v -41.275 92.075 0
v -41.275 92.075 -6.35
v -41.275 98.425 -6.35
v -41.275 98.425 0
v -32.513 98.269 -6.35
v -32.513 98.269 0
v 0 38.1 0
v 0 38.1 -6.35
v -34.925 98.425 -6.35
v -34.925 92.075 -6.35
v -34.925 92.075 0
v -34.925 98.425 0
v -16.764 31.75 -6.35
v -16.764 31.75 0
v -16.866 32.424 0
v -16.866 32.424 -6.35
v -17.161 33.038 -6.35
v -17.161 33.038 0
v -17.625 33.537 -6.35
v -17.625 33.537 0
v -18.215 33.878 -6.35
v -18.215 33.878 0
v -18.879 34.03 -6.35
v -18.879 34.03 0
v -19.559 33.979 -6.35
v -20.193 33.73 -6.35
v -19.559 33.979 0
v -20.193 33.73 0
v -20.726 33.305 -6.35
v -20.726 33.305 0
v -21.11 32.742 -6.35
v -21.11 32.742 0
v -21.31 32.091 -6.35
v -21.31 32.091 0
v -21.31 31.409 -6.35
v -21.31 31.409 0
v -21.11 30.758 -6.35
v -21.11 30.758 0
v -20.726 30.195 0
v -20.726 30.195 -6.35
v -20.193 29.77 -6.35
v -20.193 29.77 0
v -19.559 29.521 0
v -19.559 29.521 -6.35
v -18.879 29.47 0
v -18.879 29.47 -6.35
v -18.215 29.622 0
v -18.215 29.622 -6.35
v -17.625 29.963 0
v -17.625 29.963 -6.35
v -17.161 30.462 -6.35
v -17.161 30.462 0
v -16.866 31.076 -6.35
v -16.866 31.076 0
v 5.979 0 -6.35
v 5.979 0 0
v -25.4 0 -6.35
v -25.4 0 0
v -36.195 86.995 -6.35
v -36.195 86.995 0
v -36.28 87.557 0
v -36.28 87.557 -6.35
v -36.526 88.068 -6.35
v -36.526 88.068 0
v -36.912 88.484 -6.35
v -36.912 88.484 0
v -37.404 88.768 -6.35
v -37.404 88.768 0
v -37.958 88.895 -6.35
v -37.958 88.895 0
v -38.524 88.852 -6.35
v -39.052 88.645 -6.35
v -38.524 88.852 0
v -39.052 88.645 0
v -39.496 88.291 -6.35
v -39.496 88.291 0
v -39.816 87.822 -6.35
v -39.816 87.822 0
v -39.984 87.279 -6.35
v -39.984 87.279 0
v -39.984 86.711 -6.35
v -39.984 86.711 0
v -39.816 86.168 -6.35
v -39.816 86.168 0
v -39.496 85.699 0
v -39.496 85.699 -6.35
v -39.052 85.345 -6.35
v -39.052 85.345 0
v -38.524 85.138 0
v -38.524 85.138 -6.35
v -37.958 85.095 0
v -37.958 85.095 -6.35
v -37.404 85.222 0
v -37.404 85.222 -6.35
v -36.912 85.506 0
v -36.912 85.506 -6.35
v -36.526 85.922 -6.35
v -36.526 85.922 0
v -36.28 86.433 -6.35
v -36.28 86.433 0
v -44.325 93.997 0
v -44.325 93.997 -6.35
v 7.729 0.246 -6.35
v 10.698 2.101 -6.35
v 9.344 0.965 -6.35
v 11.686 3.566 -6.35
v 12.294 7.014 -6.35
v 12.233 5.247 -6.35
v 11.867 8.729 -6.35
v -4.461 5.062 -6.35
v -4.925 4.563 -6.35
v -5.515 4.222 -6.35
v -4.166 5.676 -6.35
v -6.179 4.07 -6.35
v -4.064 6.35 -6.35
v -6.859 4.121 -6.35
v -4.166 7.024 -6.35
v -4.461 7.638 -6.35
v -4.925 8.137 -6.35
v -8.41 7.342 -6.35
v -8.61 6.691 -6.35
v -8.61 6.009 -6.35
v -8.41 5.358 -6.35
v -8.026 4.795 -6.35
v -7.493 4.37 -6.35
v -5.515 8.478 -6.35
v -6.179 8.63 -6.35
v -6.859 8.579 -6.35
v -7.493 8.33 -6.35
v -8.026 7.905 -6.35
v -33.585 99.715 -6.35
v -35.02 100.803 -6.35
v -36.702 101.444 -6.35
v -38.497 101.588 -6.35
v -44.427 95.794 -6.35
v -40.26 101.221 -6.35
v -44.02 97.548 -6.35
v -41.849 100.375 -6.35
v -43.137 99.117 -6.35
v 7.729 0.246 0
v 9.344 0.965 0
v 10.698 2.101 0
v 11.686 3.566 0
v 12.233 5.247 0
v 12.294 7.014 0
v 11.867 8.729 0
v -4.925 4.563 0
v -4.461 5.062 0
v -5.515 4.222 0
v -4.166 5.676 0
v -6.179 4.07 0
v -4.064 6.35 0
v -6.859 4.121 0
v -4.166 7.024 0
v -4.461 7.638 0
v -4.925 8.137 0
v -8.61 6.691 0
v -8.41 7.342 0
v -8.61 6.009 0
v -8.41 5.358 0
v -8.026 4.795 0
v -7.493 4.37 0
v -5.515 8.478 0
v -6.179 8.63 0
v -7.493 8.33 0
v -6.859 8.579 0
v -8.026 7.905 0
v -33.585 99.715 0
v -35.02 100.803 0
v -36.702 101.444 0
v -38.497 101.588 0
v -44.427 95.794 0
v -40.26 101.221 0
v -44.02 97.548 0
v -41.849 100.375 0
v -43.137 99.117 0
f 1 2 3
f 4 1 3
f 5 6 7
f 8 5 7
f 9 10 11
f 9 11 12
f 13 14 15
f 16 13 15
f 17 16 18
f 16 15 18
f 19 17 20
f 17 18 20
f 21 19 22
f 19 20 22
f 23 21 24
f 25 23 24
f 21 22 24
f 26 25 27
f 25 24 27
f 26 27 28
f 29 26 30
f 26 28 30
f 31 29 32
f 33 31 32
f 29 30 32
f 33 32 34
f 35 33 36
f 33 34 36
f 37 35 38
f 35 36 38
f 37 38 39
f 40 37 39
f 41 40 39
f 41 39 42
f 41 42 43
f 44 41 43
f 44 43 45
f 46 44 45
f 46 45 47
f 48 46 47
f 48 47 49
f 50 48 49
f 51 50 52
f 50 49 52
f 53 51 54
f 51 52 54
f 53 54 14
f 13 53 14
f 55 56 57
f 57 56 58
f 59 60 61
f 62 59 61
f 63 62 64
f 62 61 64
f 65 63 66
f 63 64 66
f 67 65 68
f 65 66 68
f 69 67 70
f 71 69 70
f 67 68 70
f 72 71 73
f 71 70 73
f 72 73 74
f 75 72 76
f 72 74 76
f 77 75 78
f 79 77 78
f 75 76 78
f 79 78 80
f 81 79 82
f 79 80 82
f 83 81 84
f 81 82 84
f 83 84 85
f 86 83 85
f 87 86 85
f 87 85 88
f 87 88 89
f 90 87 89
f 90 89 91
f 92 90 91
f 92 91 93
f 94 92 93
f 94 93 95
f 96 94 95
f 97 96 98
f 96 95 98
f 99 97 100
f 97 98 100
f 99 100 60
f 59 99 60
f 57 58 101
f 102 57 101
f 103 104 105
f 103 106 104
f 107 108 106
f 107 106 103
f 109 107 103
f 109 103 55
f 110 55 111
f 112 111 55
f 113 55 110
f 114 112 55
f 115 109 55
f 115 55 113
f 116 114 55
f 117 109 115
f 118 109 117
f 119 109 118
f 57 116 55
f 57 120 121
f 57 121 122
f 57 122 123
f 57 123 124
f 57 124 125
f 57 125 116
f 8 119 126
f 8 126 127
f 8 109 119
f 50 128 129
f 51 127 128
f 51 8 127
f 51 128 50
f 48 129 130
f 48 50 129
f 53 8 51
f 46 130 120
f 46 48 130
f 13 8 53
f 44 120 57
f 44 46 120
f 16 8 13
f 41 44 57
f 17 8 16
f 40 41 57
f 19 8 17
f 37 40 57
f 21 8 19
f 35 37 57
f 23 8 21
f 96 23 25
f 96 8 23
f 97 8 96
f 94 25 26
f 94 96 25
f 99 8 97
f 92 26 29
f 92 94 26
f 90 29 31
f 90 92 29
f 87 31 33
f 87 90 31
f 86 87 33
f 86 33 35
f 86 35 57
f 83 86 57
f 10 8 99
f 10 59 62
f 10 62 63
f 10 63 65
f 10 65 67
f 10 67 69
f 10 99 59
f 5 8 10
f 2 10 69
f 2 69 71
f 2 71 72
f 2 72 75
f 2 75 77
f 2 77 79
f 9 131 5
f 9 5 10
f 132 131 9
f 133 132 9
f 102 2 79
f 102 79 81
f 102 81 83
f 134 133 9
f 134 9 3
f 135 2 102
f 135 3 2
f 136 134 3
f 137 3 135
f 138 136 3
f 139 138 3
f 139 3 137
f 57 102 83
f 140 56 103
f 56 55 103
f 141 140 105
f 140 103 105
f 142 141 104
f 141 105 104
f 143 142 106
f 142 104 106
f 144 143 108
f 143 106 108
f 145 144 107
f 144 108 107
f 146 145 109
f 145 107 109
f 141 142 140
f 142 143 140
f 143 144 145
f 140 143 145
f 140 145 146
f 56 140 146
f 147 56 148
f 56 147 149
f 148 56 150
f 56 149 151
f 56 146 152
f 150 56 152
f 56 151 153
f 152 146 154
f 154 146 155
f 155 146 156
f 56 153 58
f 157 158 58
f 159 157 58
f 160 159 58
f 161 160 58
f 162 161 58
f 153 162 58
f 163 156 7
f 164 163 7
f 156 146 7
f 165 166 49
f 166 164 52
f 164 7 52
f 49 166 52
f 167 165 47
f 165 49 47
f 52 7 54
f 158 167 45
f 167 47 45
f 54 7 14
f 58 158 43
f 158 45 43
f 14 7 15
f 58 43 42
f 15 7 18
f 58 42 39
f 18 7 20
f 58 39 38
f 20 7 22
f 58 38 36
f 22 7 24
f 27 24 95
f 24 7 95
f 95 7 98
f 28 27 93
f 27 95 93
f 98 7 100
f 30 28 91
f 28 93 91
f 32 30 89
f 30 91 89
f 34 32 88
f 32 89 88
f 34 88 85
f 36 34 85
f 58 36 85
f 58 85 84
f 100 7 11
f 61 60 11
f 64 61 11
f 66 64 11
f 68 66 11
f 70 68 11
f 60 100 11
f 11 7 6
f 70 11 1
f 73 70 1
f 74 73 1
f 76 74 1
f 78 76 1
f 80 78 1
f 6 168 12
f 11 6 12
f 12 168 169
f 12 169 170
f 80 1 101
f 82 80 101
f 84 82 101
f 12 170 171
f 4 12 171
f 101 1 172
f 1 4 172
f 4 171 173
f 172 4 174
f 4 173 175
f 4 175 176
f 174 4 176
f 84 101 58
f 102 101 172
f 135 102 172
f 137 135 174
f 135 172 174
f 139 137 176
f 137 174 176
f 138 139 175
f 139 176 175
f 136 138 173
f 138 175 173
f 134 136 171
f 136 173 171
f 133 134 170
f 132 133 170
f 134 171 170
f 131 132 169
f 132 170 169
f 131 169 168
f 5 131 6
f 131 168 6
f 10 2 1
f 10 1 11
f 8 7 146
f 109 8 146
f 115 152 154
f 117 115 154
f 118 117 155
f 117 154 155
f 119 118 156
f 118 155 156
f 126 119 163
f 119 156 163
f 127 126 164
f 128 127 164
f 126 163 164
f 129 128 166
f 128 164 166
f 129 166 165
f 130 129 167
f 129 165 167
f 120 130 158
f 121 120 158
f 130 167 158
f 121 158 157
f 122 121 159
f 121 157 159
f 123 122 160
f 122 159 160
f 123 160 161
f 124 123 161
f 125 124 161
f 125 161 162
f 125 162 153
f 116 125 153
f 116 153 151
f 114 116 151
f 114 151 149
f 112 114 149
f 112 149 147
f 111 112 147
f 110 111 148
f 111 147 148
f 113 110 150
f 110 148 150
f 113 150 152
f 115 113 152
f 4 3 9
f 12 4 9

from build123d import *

# Parameters (mm, degrees)
SKETCH1_R           = 2.286
SKETCH1_R_2         = 1.905
SKETCH1_W           = 6.35
SKETCH1_H           = 6.35
BOSS_EXTRUDE1_DEPTH = 6.35
FILLET1_R           = 6.35


with BuildPart() as part:
    # Sketch1 → Boss-Extrude1 (new body)
    with BuildSketch(Plane.XY):
        with BuildLine():
            Line((0, 0), (-25.4, 0))
            Line((-25.4, 0), (-44.325080611, 93.996655919))
            ThreePointArc((-44.325080611, 93.996655919), (-40.259800646, 101.221411991), (-32.513467201, 98.268799644))
            Line((-32.513467201, 98.268799644), (0, 38.1))
            Line((0, 38.1), (15.393399204, 0))
            Line((15.393399204, 0), (0, 0))
        make_face()
        with Locations((-6.35, 6.35)):
            Circle(SKETCH1_R, mode=Mode.SUBTRACT)
        with Locations((-19.05, 31.75)):
            Circle(SKETCH1_R, mode=Mode.SUBTRACT)
        with Locations((-38.1, 86.995)):
            Circle(SKETCH1_R_2, mode=Mode.SUBTRACT)
        with Locations((-38.1, 95.25)):
            Rectangle(SKETCH1_W, SKETCH1_H, mode=Mode.SUBTRACT)
    extrude(amount=-BOSS_EXTRUDE1_DEPTH)

    # Fillet1
    fillet1_edges = [part.edges().sort_by_distance(p)[0] for p in [
        (15.393399204, 0, -3.175),
    ]]
    fillet(fillet1_edges, radius=FILLET1_R)


solid = part.part
